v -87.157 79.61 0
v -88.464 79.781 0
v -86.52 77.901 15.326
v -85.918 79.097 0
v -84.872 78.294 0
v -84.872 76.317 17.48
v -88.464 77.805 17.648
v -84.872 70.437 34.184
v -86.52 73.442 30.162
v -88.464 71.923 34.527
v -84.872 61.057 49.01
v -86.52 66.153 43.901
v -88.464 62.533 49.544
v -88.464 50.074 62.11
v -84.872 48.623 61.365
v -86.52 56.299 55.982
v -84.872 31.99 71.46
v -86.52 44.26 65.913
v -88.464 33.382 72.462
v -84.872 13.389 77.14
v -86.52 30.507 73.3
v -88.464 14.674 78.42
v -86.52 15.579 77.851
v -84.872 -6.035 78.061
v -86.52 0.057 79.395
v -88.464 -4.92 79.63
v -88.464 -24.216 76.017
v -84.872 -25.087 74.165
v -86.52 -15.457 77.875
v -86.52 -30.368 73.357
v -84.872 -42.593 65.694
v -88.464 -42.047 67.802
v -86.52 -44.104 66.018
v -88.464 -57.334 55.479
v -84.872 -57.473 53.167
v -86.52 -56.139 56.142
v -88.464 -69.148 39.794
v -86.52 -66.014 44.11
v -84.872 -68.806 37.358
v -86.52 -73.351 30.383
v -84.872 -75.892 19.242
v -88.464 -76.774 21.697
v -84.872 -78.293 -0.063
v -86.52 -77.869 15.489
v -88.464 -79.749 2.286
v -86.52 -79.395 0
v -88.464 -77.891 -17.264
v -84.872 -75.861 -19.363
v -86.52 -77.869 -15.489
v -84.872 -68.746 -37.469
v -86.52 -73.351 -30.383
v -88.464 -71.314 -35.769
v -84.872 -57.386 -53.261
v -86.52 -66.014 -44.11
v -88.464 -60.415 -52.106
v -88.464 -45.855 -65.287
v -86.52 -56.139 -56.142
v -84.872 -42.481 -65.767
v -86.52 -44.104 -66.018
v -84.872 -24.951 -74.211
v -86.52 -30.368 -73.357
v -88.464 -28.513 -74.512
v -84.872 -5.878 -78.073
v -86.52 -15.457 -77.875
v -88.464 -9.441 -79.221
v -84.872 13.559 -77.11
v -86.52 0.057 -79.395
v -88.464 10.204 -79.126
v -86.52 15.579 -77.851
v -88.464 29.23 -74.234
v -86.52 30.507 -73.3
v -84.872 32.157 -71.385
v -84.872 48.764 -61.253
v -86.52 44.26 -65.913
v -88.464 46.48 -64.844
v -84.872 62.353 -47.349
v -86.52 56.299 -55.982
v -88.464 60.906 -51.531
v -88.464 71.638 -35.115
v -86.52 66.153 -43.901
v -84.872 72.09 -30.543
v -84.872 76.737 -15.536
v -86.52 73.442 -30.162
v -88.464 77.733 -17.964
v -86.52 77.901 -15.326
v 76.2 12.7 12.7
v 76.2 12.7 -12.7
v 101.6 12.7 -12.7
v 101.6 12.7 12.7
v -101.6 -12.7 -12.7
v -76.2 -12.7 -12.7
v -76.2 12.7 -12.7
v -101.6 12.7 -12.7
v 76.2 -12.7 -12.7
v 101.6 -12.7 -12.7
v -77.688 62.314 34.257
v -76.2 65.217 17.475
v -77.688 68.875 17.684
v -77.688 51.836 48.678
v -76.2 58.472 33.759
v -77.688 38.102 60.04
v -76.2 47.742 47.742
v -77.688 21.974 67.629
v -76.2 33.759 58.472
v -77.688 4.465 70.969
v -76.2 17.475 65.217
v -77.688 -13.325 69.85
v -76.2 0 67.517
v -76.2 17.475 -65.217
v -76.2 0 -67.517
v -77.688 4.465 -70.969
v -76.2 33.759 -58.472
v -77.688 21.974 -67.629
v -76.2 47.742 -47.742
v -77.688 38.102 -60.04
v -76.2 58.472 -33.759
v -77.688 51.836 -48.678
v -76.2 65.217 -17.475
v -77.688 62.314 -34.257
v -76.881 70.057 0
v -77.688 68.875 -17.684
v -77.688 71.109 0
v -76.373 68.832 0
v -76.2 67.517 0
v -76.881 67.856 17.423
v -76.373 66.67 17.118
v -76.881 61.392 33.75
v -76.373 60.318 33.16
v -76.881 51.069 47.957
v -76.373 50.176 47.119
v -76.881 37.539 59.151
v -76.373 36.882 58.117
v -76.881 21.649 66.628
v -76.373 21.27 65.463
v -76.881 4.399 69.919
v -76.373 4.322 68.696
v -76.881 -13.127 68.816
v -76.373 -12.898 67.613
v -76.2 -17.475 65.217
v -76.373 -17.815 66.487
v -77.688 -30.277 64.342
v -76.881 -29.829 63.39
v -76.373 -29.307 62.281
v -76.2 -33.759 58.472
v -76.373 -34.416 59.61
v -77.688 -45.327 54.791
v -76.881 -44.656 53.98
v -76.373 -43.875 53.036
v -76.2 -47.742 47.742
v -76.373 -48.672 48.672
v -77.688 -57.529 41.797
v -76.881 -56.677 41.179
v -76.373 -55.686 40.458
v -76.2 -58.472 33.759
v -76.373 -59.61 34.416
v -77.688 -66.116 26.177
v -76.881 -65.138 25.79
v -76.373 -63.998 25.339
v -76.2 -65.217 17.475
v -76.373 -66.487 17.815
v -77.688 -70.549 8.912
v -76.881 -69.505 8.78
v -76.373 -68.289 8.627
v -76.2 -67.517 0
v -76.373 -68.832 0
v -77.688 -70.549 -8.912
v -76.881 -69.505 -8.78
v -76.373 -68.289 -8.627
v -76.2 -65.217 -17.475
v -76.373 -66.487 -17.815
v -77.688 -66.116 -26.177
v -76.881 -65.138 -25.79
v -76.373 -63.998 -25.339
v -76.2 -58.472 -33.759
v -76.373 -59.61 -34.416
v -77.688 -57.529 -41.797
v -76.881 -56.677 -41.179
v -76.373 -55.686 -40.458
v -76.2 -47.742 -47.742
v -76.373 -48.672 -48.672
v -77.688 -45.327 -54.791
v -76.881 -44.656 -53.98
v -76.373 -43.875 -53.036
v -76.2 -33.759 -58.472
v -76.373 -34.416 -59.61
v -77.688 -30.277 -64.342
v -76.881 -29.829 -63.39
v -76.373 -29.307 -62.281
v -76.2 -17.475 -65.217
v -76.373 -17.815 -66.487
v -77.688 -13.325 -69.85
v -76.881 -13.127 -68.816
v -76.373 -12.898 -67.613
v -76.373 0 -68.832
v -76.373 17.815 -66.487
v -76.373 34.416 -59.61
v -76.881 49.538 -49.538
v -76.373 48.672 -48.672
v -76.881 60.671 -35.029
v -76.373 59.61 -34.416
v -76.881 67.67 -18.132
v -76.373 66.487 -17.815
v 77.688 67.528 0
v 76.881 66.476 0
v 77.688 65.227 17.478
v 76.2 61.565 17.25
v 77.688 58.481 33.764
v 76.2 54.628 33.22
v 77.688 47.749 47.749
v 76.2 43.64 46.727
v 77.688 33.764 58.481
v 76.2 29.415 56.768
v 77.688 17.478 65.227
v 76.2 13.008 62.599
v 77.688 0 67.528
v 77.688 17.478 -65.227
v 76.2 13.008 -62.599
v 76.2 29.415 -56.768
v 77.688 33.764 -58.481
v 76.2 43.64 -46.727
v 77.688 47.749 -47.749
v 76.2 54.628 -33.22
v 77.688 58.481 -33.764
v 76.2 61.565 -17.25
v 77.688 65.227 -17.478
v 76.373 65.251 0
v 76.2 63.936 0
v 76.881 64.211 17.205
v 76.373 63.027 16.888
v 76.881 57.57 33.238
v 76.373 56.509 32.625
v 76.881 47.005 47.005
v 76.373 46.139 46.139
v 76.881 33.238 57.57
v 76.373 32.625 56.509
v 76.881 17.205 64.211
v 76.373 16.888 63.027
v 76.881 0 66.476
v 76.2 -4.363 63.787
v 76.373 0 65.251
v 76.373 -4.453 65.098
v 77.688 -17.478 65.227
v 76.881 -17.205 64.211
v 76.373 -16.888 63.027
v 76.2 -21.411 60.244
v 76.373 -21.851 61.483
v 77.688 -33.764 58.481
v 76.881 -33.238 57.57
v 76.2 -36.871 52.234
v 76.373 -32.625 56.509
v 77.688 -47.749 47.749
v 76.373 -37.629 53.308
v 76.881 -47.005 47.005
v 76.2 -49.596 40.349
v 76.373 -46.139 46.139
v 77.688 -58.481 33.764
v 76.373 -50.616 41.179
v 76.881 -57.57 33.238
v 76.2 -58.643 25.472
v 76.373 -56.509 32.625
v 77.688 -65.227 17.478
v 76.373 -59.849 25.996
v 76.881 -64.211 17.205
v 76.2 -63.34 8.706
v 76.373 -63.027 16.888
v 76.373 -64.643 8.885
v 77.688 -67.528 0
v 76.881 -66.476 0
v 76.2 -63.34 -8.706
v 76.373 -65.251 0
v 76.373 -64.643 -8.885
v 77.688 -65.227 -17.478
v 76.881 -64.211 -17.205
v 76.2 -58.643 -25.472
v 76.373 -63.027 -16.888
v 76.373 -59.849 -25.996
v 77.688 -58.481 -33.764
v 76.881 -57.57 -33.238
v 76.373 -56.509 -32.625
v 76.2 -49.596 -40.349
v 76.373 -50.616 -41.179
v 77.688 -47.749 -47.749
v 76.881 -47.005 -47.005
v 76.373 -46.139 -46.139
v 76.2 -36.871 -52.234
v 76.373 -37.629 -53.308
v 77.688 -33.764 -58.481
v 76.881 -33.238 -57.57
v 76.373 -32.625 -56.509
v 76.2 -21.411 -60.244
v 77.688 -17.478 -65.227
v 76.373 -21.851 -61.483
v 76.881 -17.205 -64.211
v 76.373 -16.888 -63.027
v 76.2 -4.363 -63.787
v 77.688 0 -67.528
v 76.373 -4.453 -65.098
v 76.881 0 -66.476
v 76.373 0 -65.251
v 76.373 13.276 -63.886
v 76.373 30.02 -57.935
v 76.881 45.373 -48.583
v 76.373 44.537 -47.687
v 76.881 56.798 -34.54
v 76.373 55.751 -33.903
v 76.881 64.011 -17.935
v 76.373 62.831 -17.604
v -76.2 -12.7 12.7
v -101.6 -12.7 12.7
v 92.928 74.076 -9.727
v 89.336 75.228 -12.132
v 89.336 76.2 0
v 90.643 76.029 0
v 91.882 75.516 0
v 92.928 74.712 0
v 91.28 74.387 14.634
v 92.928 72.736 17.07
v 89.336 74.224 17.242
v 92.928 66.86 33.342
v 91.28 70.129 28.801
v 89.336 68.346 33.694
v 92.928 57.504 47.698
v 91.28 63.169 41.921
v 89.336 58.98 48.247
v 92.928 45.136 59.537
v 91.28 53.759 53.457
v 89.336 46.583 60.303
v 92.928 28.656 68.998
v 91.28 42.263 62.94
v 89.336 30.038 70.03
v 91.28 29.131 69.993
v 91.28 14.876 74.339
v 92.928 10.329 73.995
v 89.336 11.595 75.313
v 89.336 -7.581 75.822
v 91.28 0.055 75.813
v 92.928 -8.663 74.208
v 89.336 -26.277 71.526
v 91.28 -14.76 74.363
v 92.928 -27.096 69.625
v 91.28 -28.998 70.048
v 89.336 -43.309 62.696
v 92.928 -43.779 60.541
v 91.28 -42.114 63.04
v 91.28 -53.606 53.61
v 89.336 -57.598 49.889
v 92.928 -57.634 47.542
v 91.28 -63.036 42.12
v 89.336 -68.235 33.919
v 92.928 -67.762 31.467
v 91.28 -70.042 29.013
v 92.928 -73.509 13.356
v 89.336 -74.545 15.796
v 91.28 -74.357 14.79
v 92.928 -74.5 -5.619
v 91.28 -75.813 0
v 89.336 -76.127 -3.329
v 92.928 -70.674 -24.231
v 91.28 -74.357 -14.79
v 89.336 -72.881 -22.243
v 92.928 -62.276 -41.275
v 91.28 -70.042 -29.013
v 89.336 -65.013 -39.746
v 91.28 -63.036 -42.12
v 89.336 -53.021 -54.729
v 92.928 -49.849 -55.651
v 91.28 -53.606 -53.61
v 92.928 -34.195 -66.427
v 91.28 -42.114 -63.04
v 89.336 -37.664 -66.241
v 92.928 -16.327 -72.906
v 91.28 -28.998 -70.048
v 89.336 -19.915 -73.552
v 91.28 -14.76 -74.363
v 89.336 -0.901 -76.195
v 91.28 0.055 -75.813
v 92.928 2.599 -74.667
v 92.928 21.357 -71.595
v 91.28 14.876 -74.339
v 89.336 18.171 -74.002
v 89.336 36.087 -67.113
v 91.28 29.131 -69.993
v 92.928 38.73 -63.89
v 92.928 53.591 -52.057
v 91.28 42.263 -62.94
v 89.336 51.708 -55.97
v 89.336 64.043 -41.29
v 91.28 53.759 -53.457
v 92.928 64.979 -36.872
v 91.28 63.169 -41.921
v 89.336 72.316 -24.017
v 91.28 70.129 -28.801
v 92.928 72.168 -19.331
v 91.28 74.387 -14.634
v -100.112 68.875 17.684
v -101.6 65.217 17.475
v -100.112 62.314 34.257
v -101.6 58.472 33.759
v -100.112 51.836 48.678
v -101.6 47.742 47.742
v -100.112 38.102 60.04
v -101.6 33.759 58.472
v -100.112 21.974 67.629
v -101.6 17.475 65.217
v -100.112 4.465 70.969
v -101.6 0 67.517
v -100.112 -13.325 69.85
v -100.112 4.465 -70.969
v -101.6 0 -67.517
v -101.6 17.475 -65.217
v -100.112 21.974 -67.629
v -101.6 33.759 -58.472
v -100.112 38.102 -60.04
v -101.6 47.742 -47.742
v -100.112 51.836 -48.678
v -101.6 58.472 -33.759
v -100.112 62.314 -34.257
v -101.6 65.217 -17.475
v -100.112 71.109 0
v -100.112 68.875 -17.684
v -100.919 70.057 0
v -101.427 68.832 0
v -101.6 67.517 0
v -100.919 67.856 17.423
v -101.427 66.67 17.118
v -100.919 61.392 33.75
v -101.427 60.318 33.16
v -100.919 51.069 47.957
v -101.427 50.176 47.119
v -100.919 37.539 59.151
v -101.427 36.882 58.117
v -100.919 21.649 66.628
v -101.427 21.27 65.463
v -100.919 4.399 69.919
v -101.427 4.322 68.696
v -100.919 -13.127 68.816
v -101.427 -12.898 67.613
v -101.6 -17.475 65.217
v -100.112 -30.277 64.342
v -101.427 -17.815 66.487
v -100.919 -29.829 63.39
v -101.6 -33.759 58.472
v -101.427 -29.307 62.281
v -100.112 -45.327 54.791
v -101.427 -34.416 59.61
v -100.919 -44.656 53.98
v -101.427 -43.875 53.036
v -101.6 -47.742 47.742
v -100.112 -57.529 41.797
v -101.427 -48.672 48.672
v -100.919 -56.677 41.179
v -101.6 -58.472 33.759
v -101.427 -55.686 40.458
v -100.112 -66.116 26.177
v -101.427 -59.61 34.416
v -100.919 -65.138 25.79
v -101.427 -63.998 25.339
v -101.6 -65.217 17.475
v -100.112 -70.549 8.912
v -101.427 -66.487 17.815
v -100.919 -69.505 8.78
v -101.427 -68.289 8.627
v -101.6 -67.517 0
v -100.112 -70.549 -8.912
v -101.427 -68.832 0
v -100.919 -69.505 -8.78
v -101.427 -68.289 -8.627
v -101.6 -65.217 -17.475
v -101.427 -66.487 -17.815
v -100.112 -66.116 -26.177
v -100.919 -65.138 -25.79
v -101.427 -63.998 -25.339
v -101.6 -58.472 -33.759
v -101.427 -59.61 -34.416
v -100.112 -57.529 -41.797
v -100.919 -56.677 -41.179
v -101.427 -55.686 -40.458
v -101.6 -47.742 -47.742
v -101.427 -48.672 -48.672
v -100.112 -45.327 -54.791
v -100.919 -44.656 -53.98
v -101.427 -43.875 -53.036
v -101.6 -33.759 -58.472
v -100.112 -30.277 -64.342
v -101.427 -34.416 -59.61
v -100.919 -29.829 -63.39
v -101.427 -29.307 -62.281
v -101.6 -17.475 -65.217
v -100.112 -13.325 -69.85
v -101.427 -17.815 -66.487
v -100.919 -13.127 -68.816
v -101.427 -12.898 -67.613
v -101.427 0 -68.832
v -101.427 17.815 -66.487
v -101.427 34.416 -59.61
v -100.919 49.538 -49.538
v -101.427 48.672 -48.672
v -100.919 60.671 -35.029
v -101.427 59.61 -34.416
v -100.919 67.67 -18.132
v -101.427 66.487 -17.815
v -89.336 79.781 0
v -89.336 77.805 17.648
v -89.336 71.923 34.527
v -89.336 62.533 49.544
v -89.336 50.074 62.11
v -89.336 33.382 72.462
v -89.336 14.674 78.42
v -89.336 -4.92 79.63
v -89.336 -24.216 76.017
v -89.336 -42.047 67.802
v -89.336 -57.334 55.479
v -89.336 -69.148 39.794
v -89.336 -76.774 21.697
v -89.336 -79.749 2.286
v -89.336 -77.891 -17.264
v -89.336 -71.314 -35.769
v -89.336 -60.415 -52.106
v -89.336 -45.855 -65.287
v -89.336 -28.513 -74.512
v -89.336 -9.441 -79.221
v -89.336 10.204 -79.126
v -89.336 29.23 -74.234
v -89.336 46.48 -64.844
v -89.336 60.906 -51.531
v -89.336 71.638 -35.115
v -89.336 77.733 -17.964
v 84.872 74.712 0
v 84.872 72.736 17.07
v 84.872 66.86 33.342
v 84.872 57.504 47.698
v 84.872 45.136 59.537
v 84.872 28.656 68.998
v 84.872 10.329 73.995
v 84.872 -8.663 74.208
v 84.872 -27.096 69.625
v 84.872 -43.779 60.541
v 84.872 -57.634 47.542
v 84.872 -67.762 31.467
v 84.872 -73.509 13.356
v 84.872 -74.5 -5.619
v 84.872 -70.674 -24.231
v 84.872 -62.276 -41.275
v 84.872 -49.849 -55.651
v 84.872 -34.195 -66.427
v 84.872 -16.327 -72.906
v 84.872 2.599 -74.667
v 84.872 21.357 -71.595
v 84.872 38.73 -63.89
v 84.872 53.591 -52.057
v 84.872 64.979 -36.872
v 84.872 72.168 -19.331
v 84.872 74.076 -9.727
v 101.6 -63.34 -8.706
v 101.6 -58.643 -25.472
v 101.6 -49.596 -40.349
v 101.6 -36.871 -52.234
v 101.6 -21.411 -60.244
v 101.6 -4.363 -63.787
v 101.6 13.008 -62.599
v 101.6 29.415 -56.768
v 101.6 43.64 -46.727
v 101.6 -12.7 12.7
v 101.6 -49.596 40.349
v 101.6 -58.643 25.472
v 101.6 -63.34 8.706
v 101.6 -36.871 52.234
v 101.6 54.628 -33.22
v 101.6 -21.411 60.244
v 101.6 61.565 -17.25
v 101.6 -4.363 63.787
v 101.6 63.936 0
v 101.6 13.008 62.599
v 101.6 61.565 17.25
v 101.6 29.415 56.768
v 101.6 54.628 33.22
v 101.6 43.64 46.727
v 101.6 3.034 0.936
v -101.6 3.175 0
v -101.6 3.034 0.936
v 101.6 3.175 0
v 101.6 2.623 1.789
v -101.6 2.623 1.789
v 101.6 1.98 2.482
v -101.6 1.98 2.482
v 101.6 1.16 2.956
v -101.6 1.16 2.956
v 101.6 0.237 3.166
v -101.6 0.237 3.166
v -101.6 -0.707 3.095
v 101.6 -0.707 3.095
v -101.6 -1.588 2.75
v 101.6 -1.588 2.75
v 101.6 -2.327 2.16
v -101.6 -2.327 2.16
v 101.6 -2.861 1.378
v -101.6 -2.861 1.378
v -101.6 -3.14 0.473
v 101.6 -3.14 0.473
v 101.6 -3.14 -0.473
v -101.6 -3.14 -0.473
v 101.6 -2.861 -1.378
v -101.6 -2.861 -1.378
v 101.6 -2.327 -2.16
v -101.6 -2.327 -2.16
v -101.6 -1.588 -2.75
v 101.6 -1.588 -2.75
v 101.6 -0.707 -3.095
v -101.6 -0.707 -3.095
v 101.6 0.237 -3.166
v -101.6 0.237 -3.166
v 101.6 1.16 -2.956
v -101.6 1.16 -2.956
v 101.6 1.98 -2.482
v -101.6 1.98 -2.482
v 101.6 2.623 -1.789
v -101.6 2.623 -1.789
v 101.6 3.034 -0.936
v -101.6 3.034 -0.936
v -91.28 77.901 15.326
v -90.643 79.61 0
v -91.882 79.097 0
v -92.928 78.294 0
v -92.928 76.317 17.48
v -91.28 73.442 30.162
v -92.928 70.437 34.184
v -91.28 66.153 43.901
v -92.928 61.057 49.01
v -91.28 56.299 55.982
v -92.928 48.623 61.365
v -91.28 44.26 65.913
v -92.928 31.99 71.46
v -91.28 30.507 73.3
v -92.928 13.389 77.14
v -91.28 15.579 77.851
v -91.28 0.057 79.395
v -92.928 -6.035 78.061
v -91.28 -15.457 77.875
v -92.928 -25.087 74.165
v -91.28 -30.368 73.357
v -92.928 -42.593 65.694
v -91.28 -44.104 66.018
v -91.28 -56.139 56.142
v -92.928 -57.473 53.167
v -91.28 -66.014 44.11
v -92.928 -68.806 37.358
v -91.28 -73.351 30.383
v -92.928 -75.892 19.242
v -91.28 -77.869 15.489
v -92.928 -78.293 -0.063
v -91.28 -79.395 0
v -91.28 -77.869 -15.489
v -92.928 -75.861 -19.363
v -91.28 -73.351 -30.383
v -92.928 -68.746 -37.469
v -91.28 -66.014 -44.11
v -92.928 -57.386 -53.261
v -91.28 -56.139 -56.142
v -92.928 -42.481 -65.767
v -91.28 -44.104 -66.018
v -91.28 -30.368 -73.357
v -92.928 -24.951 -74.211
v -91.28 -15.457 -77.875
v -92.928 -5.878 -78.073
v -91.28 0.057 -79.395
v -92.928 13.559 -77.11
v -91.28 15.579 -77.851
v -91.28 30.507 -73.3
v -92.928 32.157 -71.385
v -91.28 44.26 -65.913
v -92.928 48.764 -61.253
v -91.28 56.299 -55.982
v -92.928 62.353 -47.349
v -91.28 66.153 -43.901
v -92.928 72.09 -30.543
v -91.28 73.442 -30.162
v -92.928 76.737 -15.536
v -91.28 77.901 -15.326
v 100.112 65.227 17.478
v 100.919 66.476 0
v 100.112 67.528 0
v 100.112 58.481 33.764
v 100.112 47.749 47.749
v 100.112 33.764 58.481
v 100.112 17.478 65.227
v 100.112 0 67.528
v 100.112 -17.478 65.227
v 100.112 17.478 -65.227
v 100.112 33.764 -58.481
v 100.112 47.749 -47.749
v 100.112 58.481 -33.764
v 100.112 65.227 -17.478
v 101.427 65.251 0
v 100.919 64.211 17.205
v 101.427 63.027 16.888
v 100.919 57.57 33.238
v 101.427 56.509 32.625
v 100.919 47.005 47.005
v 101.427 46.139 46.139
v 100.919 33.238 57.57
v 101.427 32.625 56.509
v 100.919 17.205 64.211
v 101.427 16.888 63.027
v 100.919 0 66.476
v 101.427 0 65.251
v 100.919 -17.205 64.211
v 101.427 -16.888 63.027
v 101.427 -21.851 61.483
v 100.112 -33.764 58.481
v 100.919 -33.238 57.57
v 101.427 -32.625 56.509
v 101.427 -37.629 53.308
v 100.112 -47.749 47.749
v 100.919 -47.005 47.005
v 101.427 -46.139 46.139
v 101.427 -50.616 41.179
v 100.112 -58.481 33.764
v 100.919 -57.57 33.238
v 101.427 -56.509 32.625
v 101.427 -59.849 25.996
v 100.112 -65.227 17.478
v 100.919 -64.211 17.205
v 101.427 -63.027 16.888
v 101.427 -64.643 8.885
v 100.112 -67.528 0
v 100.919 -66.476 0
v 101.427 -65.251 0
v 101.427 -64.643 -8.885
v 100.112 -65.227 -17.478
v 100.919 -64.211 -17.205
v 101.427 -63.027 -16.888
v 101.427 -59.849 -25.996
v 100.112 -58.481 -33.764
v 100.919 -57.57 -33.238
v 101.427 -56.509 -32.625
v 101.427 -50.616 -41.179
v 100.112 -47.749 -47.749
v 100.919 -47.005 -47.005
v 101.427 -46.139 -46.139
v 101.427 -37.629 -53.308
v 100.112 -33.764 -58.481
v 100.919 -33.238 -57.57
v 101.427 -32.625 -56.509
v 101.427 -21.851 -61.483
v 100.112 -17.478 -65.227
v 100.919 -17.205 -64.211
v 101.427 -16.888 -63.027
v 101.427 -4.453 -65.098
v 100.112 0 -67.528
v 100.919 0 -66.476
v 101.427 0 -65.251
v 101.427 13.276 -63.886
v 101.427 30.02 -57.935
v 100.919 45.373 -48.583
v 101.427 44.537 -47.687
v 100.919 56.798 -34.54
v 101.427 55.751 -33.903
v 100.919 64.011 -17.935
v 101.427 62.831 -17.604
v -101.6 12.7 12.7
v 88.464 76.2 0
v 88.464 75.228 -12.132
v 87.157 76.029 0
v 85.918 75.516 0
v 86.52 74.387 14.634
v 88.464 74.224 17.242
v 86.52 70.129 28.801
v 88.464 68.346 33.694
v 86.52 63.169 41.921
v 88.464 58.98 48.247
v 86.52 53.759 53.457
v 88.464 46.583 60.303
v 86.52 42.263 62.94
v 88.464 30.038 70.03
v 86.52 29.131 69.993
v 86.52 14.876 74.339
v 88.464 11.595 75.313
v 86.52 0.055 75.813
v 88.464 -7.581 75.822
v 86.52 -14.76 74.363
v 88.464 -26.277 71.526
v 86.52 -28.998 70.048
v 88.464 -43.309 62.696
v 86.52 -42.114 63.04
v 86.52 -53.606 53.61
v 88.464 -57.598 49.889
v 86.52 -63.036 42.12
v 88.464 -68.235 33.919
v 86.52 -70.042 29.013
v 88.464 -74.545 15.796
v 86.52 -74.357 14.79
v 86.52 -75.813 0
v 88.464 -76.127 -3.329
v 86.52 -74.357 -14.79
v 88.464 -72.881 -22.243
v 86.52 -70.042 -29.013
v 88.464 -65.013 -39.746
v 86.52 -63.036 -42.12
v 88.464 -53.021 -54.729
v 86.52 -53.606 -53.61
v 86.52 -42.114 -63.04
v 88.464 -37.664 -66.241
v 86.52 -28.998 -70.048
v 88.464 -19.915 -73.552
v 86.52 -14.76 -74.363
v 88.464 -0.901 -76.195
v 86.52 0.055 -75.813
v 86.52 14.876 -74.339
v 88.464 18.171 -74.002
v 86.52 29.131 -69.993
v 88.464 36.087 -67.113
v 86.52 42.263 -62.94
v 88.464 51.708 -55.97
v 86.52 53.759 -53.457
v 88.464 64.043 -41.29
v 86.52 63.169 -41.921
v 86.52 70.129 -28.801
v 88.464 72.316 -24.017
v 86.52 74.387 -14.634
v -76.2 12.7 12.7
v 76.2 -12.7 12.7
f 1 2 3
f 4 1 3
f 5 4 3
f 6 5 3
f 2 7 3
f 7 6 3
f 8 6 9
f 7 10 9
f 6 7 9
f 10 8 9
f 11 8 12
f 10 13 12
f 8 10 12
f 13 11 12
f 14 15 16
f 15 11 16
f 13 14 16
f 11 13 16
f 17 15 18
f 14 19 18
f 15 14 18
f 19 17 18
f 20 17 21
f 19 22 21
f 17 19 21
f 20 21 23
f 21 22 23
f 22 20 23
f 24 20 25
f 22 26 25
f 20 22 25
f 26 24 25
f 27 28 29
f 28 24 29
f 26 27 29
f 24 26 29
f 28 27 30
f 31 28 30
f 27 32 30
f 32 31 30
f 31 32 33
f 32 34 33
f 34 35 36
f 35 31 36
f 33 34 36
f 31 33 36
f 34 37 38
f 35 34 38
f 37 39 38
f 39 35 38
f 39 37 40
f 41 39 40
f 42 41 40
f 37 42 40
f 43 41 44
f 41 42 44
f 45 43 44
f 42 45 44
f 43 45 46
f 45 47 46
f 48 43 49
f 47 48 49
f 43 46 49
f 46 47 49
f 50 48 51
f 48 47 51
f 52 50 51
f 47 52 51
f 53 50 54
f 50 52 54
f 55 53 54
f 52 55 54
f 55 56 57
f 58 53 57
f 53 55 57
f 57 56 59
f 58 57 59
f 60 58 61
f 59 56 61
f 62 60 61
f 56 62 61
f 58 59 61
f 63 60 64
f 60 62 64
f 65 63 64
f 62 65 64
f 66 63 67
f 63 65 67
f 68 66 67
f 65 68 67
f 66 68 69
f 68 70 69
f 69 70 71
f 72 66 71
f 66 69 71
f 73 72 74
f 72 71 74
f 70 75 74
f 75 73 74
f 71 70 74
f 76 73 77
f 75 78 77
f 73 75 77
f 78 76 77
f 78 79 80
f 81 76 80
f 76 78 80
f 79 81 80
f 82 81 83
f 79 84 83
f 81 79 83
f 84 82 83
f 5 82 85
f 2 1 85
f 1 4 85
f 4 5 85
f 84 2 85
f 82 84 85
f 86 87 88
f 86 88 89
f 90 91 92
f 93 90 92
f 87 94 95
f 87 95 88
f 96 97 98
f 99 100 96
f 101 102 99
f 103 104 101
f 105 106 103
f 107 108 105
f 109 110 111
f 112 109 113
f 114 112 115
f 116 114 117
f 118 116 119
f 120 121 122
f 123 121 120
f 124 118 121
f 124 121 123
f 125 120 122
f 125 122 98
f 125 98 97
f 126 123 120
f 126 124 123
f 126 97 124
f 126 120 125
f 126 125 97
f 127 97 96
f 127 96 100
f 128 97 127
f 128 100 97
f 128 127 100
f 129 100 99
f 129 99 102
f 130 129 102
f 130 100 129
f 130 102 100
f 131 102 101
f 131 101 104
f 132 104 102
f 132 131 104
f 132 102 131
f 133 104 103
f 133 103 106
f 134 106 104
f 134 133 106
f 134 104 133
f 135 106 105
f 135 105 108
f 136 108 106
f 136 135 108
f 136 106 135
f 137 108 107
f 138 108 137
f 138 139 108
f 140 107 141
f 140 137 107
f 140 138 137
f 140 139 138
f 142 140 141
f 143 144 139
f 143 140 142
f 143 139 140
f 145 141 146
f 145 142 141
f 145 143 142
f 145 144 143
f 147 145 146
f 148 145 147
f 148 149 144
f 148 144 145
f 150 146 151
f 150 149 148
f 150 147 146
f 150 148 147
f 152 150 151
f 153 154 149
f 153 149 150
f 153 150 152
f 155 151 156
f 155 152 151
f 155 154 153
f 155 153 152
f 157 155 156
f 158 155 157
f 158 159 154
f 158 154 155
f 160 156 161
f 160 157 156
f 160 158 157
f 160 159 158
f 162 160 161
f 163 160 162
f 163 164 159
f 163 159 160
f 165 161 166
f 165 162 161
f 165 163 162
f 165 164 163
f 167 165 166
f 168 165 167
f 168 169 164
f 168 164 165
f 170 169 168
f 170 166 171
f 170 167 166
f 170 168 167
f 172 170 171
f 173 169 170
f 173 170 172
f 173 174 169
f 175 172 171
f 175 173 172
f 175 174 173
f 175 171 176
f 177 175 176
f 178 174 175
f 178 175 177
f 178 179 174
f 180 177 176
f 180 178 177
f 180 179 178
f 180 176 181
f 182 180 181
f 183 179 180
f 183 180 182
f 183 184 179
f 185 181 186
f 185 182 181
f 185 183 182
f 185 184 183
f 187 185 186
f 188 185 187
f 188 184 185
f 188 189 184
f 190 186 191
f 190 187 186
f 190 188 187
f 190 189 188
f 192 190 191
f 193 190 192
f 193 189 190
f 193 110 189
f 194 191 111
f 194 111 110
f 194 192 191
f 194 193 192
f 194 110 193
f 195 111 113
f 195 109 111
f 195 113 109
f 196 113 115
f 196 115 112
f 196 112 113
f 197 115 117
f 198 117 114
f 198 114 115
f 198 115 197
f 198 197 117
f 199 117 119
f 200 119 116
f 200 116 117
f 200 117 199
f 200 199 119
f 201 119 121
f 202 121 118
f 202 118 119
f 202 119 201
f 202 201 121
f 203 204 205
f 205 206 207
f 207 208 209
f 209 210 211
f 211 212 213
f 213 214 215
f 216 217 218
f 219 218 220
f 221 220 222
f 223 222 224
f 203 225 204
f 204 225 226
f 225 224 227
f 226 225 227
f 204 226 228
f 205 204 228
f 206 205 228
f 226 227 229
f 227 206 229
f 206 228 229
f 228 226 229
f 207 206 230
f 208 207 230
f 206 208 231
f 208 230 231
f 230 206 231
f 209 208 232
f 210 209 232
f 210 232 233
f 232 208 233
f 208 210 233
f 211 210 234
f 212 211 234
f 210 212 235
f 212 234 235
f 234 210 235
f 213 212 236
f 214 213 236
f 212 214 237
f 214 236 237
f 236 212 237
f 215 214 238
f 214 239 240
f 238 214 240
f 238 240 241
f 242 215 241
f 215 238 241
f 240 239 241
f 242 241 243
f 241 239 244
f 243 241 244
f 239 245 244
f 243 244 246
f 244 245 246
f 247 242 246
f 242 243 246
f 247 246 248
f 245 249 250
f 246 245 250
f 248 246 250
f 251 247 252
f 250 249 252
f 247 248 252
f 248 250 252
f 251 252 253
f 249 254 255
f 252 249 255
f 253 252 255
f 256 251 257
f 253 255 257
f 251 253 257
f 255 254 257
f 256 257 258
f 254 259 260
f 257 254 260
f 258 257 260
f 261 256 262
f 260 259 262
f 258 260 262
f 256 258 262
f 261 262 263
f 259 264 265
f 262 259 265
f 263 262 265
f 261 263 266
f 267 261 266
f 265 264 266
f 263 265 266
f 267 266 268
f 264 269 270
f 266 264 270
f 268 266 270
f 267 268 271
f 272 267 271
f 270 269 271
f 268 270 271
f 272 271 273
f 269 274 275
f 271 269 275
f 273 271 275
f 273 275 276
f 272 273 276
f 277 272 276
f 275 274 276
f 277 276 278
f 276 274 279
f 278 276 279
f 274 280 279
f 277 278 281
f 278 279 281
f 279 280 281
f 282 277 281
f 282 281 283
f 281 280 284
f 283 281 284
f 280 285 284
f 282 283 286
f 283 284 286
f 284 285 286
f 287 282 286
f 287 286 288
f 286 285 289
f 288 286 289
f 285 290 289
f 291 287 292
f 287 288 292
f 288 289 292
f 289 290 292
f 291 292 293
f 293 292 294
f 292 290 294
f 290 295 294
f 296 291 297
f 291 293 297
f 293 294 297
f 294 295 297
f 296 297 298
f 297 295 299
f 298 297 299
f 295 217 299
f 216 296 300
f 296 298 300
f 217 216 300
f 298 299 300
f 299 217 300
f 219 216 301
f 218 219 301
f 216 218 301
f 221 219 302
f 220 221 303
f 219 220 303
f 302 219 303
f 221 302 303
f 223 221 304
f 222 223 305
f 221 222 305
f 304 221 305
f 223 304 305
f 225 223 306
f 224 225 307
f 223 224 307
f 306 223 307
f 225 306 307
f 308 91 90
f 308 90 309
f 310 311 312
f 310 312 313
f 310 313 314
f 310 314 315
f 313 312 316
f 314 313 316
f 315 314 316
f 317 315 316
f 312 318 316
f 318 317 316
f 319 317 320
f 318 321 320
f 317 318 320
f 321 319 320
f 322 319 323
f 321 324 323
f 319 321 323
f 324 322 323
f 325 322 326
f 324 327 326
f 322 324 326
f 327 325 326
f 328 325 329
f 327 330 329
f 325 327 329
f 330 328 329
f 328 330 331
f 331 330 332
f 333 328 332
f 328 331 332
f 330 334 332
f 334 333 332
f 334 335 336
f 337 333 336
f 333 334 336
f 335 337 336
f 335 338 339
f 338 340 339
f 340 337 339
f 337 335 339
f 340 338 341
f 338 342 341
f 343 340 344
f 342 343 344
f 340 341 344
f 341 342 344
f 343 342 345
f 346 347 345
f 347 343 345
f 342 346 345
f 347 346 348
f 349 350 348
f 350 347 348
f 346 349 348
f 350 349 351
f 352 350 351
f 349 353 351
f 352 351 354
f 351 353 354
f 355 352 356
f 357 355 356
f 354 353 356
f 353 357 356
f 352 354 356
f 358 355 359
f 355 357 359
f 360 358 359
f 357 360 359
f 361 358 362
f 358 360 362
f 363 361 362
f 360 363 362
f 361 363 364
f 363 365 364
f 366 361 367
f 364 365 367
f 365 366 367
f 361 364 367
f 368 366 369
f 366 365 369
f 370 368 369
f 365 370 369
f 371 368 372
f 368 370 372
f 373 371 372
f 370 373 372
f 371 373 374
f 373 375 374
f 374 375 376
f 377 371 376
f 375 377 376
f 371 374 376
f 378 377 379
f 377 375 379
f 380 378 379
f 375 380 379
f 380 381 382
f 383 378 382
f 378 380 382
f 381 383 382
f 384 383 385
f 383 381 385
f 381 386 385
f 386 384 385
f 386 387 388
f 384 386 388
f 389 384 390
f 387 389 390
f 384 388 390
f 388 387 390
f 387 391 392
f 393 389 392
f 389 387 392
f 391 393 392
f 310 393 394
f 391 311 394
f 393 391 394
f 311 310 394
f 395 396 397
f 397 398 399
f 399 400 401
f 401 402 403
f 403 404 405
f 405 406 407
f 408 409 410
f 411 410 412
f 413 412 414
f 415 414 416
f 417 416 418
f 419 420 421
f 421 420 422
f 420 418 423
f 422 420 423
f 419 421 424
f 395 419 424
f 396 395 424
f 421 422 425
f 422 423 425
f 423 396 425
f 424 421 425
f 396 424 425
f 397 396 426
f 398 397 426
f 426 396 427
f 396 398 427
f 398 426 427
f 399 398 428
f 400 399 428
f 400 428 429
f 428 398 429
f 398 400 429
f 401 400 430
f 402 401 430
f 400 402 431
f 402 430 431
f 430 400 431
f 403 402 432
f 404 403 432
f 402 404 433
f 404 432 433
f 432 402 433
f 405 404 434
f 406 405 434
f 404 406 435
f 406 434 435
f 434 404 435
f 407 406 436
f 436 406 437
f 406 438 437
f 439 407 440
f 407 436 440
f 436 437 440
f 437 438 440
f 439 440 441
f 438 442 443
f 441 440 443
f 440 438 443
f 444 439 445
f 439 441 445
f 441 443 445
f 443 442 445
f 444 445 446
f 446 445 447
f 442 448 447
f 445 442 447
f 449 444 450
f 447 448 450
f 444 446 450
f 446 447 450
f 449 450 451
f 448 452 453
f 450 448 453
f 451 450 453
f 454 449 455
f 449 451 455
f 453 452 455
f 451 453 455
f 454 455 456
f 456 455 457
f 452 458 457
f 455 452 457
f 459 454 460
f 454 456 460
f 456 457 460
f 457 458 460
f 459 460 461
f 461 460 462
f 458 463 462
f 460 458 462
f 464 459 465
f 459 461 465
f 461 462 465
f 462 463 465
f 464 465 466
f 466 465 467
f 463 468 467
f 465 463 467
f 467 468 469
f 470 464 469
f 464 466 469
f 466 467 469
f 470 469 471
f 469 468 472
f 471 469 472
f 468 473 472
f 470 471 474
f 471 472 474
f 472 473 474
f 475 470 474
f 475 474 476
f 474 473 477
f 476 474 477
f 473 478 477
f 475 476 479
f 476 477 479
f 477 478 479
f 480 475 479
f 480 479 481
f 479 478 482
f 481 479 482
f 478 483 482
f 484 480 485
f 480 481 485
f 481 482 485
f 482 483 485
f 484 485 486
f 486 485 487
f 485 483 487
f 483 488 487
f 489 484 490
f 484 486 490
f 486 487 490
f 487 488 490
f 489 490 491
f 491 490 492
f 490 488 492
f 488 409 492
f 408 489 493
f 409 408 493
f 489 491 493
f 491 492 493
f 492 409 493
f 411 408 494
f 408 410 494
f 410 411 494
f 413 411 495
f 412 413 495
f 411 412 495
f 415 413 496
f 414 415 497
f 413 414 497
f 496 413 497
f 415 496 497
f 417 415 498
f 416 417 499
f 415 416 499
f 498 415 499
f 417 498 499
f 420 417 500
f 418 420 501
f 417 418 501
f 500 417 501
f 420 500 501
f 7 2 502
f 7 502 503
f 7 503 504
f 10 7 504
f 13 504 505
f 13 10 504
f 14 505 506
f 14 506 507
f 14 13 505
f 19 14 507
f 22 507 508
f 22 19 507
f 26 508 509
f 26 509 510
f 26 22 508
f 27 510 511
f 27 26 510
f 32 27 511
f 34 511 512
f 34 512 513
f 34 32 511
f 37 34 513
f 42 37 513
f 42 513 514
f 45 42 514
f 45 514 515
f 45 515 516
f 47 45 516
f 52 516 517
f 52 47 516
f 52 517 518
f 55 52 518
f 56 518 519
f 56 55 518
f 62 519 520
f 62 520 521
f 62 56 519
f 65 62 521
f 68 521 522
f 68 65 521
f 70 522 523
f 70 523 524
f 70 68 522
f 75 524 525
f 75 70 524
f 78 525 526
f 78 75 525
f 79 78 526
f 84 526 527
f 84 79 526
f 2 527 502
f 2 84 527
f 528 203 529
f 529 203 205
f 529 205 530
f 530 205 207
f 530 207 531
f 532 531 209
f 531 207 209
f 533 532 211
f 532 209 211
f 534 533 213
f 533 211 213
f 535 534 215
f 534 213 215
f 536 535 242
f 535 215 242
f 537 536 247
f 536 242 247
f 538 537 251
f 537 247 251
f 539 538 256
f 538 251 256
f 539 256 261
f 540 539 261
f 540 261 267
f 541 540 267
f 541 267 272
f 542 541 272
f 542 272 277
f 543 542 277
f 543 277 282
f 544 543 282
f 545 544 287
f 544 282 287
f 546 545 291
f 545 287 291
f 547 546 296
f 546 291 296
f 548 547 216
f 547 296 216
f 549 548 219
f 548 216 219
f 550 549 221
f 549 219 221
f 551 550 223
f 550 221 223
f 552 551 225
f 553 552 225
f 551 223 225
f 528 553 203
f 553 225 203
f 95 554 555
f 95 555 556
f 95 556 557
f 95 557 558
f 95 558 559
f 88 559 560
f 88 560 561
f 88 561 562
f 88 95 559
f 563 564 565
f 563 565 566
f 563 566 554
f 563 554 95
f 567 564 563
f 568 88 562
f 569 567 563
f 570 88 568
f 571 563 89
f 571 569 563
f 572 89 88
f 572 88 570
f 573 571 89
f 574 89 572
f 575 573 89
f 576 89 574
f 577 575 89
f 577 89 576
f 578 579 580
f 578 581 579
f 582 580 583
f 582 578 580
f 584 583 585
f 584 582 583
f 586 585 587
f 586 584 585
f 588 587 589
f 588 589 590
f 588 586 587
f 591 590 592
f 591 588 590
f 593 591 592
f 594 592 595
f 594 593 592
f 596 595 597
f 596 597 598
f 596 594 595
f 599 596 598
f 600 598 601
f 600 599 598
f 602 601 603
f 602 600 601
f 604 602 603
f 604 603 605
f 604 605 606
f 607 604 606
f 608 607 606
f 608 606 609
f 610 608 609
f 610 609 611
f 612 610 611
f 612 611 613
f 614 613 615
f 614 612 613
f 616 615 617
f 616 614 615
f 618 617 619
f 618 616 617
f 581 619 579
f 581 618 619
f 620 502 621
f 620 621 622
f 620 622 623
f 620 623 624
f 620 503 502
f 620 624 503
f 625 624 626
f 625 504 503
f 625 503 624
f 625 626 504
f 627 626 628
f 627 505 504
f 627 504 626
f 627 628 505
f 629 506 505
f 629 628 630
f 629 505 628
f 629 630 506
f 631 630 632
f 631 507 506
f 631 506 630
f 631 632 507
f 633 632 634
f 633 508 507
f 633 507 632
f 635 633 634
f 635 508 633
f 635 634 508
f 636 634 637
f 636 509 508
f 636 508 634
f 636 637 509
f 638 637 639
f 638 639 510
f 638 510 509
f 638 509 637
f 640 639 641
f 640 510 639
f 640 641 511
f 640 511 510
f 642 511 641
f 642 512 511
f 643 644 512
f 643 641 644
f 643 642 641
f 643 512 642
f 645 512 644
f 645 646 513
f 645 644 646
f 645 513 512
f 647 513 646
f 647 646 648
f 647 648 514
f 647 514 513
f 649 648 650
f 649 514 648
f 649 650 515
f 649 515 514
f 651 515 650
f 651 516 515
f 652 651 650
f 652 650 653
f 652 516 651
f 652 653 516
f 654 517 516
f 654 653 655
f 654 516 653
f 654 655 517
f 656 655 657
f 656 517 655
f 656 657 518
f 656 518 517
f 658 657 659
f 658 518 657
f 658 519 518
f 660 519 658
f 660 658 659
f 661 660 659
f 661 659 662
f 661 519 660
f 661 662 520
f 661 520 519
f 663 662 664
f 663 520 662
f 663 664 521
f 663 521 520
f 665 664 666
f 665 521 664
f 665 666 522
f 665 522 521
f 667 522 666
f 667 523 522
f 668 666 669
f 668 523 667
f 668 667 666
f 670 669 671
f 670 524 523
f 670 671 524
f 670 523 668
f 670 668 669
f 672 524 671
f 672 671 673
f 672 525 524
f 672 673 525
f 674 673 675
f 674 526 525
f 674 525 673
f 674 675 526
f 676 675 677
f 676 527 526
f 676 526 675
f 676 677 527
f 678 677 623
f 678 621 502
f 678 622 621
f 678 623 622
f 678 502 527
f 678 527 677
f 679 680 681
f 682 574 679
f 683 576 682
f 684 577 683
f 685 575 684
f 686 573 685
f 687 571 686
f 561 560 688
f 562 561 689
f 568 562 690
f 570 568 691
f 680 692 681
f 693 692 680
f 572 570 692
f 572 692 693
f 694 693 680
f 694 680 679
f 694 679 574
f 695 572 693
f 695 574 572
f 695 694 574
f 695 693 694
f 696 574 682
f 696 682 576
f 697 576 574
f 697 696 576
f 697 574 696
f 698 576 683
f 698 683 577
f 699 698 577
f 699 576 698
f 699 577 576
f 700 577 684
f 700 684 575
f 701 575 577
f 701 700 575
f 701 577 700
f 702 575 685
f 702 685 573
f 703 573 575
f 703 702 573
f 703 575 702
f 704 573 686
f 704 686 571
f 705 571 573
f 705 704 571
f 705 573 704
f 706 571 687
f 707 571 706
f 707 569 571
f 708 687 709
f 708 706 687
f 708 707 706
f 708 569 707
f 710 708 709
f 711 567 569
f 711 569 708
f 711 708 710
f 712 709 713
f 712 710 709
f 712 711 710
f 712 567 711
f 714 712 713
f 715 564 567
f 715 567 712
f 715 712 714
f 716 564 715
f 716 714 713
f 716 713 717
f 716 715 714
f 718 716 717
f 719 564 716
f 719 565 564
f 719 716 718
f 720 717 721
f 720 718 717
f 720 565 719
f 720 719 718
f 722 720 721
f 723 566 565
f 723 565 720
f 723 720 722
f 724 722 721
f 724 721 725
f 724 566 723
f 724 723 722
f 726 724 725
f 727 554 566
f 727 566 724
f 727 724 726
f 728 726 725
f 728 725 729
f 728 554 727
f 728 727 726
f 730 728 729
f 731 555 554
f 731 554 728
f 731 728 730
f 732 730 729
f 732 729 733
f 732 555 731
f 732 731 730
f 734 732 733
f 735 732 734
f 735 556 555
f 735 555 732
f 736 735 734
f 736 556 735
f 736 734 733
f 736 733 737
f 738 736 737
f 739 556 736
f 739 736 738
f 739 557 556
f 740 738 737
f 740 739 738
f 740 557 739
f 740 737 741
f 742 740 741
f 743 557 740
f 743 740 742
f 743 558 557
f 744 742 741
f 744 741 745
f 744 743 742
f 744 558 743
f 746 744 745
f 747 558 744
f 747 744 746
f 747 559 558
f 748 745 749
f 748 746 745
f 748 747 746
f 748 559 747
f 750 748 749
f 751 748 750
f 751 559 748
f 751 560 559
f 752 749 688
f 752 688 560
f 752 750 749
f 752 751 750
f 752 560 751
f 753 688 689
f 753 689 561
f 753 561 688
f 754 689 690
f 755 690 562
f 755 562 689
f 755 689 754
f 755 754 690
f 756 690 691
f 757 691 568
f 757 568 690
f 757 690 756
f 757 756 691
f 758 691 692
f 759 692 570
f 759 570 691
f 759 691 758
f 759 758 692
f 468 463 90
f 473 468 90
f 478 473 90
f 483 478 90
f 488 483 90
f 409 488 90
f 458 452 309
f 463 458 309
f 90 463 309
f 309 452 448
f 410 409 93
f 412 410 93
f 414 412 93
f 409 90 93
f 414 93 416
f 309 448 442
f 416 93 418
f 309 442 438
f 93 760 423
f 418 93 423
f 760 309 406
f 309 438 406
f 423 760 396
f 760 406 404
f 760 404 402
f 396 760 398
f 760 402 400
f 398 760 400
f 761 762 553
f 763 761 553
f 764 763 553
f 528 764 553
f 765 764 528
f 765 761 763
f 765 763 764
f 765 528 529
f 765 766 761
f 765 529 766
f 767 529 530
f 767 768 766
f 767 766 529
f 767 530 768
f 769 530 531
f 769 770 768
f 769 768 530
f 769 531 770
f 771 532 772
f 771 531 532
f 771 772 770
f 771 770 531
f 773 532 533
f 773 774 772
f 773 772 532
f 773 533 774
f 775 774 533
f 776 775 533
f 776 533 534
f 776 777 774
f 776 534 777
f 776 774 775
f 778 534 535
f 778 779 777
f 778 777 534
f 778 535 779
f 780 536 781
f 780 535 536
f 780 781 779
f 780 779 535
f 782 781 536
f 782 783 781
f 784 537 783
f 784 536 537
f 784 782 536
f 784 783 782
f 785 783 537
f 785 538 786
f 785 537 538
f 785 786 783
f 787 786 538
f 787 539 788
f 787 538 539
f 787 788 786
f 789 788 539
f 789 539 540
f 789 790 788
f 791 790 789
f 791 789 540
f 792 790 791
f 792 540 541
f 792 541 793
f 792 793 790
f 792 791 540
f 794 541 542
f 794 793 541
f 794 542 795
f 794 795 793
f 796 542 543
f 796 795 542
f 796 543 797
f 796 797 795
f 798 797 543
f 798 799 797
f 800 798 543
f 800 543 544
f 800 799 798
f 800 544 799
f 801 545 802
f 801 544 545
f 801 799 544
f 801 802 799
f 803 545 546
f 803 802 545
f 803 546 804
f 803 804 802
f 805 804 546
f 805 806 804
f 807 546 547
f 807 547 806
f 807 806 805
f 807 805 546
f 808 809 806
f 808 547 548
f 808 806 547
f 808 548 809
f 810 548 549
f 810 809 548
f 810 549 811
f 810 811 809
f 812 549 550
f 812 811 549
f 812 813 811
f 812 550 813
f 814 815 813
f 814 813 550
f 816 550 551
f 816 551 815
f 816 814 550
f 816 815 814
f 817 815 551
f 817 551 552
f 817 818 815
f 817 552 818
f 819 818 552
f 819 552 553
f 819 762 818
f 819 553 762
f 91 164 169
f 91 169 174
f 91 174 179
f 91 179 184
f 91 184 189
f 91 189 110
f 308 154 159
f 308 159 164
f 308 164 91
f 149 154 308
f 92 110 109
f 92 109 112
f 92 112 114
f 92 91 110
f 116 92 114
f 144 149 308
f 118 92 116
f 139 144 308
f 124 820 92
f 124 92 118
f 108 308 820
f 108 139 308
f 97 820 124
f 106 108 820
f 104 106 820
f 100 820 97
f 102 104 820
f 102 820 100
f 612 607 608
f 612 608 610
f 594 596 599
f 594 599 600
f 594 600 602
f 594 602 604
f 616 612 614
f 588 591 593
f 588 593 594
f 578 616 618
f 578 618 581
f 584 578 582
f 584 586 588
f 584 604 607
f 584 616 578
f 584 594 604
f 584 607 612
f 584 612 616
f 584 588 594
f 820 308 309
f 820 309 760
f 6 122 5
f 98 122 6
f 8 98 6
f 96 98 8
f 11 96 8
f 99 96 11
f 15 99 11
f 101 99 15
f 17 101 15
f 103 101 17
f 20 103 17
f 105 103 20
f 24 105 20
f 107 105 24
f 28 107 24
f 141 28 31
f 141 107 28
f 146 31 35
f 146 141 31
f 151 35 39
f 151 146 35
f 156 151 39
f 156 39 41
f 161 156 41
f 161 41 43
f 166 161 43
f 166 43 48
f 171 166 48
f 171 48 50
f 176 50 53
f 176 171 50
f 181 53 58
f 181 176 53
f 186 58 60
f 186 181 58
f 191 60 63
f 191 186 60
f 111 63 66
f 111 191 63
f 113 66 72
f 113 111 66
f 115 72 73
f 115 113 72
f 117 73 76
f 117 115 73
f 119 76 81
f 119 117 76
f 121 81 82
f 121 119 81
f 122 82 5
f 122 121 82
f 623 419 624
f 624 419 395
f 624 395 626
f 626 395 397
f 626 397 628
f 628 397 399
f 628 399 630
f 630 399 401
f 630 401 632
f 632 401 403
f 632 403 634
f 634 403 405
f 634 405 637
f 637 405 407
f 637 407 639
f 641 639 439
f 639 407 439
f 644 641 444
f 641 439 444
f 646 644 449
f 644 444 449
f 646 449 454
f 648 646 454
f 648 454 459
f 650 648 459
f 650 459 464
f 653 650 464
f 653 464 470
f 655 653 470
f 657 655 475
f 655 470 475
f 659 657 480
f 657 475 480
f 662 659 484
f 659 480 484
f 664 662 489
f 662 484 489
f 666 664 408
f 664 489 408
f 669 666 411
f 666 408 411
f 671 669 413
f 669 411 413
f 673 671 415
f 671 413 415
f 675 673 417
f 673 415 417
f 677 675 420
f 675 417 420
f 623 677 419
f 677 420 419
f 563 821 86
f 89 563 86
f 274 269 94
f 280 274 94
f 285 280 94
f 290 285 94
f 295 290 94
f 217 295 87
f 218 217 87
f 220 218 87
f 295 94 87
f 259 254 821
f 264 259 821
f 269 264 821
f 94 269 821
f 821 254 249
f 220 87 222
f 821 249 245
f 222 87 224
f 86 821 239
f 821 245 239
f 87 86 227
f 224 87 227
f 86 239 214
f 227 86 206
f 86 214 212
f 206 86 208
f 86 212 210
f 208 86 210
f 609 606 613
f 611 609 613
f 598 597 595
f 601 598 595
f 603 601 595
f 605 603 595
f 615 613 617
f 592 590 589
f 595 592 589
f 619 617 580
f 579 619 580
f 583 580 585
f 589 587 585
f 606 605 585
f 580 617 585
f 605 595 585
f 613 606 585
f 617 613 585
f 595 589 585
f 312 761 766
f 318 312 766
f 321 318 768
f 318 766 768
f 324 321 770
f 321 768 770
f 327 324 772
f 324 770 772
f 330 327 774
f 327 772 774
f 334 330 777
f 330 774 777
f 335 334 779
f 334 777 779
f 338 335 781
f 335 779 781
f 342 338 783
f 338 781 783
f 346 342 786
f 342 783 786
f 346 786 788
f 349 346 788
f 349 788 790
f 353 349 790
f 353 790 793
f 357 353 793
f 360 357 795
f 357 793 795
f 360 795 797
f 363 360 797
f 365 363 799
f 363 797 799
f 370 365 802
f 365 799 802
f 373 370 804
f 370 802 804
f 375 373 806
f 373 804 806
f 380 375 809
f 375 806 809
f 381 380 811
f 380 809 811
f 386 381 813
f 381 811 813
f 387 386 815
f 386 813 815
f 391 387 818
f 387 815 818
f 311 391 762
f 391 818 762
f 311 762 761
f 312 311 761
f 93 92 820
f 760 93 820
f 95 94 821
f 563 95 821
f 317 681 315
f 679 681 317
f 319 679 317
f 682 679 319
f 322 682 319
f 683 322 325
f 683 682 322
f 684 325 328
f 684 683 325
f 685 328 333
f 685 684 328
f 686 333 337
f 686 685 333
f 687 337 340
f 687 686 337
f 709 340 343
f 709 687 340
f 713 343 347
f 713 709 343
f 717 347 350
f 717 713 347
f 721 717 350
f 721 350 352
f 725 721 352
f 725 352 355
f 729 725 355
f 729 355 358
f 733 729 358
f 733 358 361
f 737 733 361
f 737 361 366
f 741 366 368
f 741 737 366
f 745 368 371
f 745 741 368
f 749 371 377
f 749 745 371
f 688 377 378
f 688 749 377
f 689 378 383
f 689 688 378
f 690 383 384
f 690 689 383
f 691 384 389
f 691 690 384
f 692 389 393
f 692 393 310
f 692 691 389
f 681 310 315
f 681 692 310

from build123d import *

# Parameters (mm, degrees)
F2_R      = 3.175
F3_DEPTH  = 101.6
F5_R      = 76.2
F5_W      = 25.4
F5_H      = 25.4
F6_DEPTH  = 25.4
F4_R      = 79.7814
F4_W      = 25.4
F4_H      = 25.4
F7_DEPTH  = 25.4
F8_SIZE   = 10.16
F8_2_SIZE = 10.16
F9_R      = 5.08
F9_2_R    = 5.08


with BuildPart() as f3:
    # F2 (on Right) → F3 (new body, symmetric)
    with BuildSketch(Plane.YZ):
        Circle(F2_R)
    extrude(amount=F3_DEPTH, both=True)


with BuildPart() as f6:
    # F5 (on offset) → F6 (new body)
    with BuildSketch(Plane.YZ.offset(76.2)):
        Circle(F5_R)
        Rectangle(F5_W, F5_H, mode=Mode.SUBTRACT)
    extrude(amount=F6_DEPTH)

    # F8#2
    f8_2_edges = [f6.edges().sort_by_distance(p)[0] for p in [
        (88.9, 76.2, 0),
        (76.2, -76.2, 0),
        (101.6, -76.2, 0),
    ]]
    chamfer(f8_2_edges, length=F8_2_SIZE)

    # F9#2
    f9_2_edges = [f6.edges().sort_by_distance(p)[0] for p in [
        (86.36, -76.2, 0),
        (91.44, -76.2, 0),
        (101.6, -66.04, 0),
        (81.28, 71.12, 0),
        (76.2, -66.04, 0),
    ]]
    fillet(f9_2_edges, radius=F9_2_R)


with BuildPart() as f7:
    # F4 (on offset) → F7 (new body)
    with BuildSketch(Plane.YZ.offset(-76.2)):
        Circle(F4_R)
        Rectangle(F4_W, F4_H, mode=Mode.SUBTRACT)
    extrude(amount=-F7_DEPTH)

    # F8
    f8_edges = [f7.edges().sort_by_distance(p)[0] for p in [
        (-88.9, 79.7814, 0),
        (-76.2, -79.7814, 0),
        (-101.6, -79.7814, 0),
    ]]
    chamfer(f8_edges, length=F8_SIZE)

    # F9
    f9_edges = [f7.edges().sort_by_distance(p)[0] for p in [
        (-88.9, 79.7814, 0),
        (-86.36, -79.7814, 0),
        (-91.44, -79.7814, 0),
        (-101.6, -69.6214, 0),
        (-76.2, -69.6214, 0),
    ]]
    fillet(f9_edges, radius=F9_R)


solid = Compound([f3.part, f6.part, f7.part])
